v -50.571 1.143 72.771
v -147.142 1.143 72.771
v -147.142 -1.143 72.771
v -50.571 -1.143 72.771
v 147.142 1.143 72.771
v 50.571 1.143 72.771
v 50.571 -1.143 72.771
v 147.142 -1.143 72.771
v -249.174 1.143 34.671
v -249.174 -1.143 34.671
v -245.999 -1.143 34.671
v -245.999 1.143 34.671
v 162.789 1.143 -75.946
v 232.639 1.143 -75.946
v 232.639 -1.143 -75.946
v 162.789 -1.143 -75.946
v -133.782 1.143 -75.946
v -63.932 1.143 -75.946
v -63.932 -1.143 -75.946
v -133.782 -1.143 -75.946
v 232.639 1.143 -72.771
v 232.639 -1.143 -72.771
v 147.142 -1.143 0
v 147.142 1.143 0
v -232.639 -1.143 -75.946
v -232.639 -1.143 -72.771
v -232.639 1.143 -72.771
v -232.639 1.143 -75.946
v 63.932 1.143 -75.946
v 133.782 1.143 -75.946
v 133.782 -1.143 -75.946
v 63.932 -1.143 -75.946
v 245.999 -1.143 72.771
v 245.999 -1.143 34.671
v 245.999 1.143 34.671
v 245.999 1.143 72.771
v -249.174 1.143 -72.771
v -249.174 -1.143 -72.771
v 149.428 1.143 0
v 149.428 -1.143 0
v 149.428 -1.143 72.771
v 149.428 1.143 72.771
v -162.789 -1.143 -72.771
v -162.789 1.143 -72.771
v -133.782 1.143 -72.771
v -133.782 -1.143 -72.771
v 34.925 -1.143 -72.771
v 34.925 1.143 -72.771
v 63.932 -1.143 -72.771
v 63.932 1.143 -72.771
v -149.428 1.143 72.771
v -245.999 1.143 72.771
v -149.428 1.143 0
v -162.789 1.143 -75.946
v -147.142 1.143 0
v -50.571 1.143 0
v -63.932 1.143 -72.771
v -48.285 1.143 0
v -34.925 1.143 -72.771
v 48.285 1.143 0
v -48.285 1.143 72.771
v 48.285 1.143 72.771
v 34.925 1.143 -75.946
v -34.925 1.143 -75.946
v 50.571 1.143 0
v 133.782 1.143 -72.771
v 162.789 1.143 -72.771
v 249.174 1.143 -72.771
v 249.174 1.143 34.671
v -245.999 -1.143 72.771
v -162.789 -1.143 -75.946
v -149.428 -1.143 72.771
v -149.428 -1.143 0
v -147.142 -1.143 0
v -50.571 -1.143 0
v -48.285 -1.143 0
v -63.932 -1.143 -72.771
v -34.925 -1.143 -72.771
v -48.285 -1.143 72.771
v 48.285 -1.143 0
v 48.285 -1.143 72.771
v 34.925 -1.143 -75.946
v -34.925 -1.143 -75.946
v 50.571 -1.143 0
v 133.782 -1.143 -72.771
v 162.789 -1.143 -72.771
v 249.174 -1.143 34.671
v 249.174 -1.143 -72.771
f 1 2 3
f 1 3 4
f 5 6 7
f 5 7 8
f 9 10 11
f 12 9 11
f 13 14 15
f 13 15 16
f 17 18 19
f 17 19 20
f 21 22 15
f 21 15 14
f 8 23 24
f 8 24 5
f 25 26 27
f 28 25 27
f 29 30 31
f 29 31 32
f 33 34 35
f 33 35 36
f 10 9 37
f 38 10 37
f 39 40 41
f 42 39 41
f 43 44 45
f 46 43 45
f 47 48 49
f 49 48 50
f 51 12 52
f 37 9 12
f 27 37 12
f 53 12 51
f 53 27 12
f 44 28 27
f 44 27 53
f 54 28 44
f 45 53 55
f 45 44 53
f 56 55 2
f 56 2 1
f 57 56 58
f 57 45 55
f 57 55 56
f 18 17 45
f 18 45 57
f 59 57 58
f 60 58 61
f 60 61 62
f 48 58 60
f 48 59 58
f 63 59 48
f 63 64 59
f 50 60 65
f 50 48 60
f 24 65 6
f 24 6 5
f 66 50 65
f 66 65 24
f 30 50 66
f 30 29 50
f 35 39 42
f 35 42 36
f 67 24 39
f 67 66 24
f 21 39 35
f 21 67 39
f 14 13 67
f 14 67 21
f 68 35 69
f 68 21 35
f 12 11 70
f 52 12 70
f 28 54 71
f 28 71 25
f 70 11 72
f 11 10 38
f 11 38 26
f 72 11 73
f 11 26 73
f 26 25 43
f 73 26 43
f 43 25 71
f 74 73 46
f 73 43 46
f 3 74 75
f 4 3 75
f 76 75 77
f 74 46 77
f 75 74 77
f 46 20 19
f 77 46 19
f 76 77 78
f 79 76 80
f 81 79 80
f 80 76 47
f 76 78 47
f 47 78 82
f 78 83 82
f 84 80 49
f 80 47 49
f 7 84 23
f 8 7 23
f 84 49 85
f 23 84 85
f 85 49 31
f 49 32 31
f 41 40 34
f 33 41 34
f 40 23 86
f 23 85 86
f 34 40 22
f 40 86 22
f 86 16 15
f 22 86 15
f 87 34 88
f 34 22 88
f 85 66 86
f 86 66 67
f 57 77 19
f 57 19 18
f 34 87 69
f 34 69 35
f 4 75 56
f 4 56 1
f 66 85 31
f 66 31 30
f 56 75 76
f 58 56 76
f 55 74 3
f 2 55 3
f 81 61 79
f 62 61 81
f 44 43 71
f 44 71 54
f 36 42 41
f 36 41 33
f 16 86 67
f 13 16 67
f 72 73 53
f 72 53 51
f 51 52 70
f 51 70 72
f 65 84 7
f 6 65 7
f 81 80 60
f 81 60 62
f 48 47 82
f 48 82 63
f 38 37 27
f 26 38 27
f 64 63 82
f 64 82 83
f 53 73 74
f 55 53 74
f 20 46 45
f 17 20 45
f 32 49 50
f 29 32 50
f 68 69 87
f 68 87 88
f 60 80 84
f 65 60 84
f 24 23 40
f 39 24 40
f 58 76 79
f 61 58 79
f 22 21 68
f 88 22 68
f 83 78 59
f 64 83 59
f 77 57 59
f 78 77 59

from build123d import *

# Parameters (mm, degrees)
SKETCH1_W           = 498.348
SKETCH1_H           = 145.542
BOSS_EXTRUDE1_DEPTH = 1.143
SKETCH2_W           = 69.85
SKETCH2_H           = 2.286
BOSS_EXTRUDE2_DEPTH = 3.175
LPATTERN1_COUNT     = 5
LPATTERN1_PITCH     = 98.8568
SKETCH3_W           = 3.175
SKETCH3_H           = 38.1
CUT_EXTRUDE1_DEPTH  = 3.286
SKETCH5_W           = 2.286
SKETCH5_H           = 72.771
CUT_EXTRUDE2_DEPTH  = 3.286
LPATTERN2_COUNT     = 4
LPATTERN2_PITCH     = 98.8568


with BuildPart() as part:
    # Sketch1 → Boss-Extrude1 (new body, symmetric)
    with BuildSketch(Plane(origin=(0, 0, 0), x_dir=(1, 0, 0), z_dir=(0, 1, 0))):
        Rectangle(SKETCH1_W, SKETCH1_H)
    extrude(amount=BOSS_EXTRUDE1_DEPTH, both=True)

    # Sketch2 → Boss-Extrude2 (add)
    with BuildSketch(Plane(origin=(0, 0, -72.771), x_dir=(-1, 0, 0), z_dir=(0, 0, -1))):
        with Locations((-197.7136, 0)):
            Rectangle(SKETCH2_W, SKETCH2_H)
    boss_extrude2 = extrude(amount=BOSS_EXTRUDE2_DEPTH)

    # LPattern1: Boss-Extrude2 ×5
    with Locations(*[(-i * LPATTERN1_PITCH, 0, 0) for i in range(1, LPATTERN1_COUNT)]):
        add(boss_extrude2)

    # Sketch3 → Cut-Extrude1 (cut, through all)
    with BuildSketch(Plane.XZ.offset(1.143)):
        with Locations((-247.5865, 53.721)):
            Rectangle(SKETCH3_W, SKETCH3_H)
    cut_extrude1 = extrude(amount=-CUT_EXTRUDE1_DEPTH, mode=Mode.SUBTRACT)

    # Mirror2: Cut-Extrude1 across plane
    add(cut_extrude1.mirror(Plane(origin=(0, 0, 0), x_dir=(0, 0, 1), z_dir=(1, 0, 0))), mode=Mode.SUBTRACT)

    # Sketch5 → Cut-Extrude2 (cut, through all)
    with BuildSketch(Plane.XZ.offset(1.143)):
        with Locations((-148.2852, 36.3855)):
            Rectangle(SKETCH5_W, SKETCH5_H)
    cut_extrude2 = extrude(amount=-CUT_EXTRUDE2_DEPTH, mode=Mode.SUBTRACT)

    # LPattern2: Cut-Extrude2 ×4
    with Locations(*[(i * LPATTERN2_PITCH, 0, 0) for i in range(1, LPATTERN2_COUNT)]):
        add(cut_extrude2, mode=Mode.SUBTRACT)


solid = part.part
